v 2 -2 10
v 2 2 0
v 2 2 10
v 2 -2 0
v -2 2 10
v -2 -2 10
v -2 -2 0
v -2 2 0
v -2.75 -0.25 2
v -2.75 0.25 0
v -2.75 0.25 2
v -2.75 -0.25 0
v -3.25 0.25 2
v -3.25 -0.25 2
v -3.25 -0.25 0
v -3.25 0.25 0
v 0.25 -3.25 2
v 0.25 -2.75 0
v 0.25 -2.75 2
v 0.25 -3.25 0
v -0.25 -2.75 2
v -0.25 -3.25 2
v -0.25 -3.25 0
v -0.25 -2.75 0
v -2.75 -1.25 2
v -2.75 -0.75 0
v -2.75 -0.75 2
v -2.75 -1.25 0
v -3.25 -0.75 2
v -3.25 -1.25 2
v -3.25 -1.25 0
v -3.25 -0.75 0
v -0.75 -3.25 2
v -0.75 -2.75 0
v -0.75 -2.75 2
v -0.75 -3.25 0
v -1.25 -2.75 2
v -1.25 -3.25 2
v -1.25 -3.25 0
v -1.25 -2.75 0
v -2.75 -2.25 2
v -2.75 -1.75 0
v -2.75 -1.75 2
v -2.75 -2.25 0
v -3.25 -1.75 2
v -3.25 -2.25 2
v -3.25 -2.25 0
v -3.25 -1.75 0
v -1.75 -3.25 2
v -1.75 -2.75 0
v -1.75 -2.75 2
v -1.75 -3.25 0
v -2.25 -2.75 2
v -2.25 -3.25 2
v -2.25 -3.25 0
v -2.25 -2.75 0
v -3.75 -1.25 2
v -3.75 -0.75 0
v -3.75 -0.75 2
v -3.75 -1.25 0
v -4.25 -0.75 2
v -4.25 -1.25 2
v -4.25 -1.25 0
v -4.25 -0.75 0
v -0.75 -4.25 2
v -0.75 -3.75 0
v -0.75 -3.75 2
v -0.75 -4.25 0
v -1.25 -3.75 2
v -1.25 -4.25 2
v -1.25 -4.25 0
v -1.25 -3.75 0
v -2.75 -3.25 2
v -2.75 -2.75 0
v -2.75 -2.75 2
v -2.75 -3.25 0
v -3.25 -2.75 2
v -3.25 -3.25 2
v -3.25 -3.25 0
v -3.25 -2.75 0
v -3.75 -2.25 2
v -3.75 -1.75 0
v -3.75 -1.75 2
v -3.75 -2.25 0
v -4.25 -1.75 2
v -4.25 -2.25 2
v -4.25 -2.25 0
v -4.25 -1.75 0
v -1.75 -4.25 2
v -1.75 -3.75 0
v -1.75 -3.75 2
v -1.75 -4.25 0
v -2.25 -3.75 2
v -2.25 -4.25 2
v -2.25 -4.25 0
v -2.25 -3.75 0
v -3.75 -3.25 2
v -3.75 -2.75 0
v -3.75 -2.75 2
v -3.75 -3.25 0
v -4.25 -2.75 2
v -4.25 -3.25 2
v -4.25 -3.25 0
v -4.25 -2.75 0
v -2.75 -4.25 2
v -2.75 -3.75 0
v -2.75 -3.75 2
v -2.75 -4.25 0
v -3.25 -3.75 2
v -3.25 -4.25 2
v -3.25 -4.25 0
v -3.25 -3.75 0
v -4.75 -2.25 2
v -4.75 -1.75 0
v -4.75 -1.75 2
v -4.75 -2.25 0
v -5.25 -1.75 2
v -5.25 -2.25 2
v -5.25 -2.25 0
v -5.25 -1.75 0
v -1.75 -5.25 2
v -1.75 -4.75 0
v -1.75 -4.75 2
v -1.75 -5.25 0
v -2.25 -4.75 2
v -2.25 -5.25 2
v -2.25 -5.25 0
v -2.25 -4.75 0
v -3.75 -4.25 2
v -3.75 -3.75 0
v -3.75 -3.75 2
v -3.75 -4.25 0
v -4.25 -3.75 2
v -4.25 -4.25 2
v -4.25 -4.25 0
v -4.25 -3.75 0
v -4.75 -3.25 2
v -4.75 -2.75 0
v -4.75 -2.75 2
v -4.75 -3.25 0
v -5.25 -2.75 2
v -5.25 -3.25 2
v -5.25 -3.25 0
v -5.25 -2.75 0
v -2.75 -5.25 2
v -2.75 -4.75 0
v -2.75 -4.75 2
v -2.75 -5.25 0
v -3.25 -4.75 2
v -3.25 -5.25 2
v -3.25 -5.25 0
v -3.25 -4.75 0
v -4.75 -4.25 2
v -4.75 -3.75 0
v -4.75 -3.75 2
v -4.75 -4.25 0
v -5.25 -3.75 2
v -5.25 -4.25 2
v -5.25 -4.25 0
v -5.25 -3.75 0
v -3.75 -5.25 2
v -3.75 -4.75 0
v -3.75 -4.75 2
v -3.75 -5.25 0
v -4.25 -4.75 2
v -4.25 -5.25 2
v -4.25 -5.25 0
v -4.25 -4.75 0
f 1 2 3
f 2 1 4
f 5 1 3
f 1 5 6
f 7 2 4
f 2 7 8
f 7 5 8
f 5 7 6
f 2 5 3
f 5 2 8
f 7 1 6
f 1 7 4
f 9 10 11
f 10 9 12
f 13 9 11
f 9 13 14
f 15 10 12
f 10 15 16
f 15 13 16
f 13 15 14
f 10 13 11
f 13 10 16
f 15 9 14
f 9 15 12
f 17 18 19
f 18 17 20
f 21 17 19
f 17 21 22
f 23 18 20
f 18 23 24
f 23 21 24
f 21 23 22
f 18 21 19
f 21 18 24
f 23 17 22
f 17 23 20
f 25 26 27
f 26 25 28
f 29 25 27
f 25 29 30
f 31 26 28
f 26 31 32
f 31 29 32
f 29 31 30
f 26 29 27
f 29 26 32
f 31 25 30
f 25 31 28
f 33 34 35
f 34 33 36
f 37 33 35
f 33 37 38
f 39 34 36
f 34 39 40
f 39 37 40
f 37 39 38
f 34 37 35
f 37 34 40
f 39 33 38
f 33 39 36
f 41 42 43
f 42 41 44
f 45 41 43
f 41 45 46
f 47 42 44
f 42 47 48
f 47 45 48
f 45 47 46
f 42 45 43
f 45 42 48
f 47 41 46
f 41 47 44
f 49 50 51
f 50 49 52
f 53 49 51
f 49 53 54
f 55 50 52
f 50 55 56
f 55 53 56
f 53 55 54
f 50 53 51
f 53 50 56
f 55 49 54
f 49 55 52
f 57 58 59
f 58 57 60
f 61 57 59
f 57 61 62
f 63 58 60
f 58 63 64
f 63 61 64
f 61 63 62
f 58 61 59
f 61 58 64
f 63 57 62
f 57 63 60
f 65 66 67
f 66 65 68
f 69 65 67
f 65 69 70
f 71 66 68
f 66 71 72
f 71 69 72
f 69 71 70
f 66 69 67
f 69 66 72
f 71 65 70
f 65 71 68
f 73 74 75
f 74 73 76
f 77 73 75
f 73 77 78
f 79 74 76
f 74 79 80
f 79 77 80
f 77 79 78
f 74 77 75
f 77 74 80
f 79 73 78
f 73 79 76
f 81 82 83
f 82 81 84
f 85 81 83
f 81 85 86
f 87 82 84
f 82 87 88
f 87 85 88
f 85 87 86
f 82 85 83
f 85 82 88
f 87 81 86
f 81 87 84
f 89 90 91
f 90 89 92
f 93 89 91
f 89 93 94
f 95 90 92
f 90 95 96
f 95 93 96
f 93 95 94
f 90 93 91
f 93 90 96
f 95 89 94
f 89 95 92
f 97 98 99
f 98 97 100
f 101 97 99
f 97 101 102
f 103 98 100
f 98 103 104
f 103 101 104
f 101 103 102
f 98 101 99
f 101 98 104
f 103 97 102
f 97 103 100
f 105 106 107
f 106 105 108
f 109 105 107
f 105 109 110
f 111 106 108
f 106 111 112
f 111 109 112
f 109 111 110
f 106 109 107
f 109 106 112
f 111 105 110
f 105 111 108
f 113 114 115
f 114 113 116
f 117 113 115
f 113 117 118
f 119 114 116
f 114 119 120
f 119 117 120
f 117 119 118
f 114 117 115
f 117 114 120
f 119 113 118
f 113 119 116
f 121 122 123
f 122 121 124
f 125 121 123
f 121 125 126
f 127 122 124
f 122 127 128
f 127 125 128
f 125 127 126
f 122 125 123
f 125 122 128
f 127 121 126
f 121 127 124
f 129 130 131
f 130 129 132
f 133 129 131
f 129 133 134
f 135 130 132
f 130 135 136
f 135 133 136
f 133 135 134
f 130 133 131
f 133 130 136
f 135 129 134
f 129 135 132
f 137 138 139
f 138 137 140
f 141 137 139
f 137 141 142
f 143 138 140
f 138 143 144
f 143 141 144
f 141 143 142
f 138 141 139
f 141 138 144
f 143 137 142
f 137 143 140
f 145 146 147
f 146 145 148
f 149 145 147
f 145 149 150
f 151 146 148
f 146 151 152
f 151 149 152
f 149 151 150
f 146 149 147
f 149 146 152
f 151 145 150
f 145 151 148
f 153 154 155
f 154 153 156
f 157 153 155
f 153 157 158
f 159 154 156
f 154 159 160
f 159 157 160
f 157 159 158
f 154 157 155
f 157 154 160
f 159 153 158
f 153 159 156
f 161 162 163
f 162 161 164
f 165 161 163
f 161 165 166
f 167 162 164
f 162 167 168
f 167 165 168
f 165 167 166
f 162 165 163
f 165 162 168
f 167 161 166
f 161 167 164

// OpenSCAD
translate([0, 0, 5]) color([0,1,0,0.9]) cube([4, 4, 10], center=true);
translate([-3.0, 0.0, 1]) color([1,0,0]) cube([0.5, 0.5, 2], center=true);
translate([0.0, -3.0, 1]) color([1,0,0]) cube([0.5, 0.5, 2], center=true);
translate([-3.0, -1.0, 1]) color([1,0,0]) cube([0.5, 0.5, 2], center=true);
translate([-1.0, -3.0, 1]) color([1,0,0]) cube([0.5, 0.5, 2], center=true);
translate([-3.0, -2.0, 1]) color([1,0,0]) cube([0.5, 0.5, 2], center=true);
translate([-2.0, -3.0, 1]) color([1,0,0]) cube([0.5, 0.5, 2], center=true);
translate([-4.0, -1.0, 1]) color([1,0,0]) cube([0.5, 0.5, 2], center=true);
translate([-1.0, -4.0, 1]) color([1,0,0]) cube([0.5, 0.5, 2], center=true);
translate([-3.0, -3.0, 1]) color([1,0,0]) cube([0.5, 0.5, 2], center=true);
translate([-4.0, -2.0, 1]) color([1,0,0]) cube([0.5, 0.5, 2], center=true);
translate([-2.0, -4.0, 1]) color([1,0,0]) cube([0.5, 0.5, 2], center=true);
translate([-4.0, -3.0, 1]) color([1,0,0]) cube([0.5, 0.5, 2], center=true);
translate([-3.0, -4.0, 1]) color([1,0,0]) cube([0.5, 0.5, 2], center=true);
translate([-5.0, -2.0, 1]) color([1,0,0]) cube([0.5, 0.5, 2], center=true);
translate([-2.0, -5.0, 1]) color([1,0,0]) cube([0.5, 0.5, 2], center=true);
translate([-4.0, -4.0, 1]) color([1,0,0]) cube([0.5, 0.5, 2], center=true);
translate([-5.0, -3.0, 1]) color([1,0,0]) cube([0.5, 0.5, 2], center=true);
translate([-3.0, -5.0, 1]) color([1,0,0]) cube([0.5, 0.5, 2], center=true);
translate([-5.0, -4.0, 1]) color([1,0,0]) cube([0.5, 0.5, 2], center=true);
translate([-4.0, -5.0, 1]) color([1,0,0]) cube([0.5, 0.5, 2], center=true);
